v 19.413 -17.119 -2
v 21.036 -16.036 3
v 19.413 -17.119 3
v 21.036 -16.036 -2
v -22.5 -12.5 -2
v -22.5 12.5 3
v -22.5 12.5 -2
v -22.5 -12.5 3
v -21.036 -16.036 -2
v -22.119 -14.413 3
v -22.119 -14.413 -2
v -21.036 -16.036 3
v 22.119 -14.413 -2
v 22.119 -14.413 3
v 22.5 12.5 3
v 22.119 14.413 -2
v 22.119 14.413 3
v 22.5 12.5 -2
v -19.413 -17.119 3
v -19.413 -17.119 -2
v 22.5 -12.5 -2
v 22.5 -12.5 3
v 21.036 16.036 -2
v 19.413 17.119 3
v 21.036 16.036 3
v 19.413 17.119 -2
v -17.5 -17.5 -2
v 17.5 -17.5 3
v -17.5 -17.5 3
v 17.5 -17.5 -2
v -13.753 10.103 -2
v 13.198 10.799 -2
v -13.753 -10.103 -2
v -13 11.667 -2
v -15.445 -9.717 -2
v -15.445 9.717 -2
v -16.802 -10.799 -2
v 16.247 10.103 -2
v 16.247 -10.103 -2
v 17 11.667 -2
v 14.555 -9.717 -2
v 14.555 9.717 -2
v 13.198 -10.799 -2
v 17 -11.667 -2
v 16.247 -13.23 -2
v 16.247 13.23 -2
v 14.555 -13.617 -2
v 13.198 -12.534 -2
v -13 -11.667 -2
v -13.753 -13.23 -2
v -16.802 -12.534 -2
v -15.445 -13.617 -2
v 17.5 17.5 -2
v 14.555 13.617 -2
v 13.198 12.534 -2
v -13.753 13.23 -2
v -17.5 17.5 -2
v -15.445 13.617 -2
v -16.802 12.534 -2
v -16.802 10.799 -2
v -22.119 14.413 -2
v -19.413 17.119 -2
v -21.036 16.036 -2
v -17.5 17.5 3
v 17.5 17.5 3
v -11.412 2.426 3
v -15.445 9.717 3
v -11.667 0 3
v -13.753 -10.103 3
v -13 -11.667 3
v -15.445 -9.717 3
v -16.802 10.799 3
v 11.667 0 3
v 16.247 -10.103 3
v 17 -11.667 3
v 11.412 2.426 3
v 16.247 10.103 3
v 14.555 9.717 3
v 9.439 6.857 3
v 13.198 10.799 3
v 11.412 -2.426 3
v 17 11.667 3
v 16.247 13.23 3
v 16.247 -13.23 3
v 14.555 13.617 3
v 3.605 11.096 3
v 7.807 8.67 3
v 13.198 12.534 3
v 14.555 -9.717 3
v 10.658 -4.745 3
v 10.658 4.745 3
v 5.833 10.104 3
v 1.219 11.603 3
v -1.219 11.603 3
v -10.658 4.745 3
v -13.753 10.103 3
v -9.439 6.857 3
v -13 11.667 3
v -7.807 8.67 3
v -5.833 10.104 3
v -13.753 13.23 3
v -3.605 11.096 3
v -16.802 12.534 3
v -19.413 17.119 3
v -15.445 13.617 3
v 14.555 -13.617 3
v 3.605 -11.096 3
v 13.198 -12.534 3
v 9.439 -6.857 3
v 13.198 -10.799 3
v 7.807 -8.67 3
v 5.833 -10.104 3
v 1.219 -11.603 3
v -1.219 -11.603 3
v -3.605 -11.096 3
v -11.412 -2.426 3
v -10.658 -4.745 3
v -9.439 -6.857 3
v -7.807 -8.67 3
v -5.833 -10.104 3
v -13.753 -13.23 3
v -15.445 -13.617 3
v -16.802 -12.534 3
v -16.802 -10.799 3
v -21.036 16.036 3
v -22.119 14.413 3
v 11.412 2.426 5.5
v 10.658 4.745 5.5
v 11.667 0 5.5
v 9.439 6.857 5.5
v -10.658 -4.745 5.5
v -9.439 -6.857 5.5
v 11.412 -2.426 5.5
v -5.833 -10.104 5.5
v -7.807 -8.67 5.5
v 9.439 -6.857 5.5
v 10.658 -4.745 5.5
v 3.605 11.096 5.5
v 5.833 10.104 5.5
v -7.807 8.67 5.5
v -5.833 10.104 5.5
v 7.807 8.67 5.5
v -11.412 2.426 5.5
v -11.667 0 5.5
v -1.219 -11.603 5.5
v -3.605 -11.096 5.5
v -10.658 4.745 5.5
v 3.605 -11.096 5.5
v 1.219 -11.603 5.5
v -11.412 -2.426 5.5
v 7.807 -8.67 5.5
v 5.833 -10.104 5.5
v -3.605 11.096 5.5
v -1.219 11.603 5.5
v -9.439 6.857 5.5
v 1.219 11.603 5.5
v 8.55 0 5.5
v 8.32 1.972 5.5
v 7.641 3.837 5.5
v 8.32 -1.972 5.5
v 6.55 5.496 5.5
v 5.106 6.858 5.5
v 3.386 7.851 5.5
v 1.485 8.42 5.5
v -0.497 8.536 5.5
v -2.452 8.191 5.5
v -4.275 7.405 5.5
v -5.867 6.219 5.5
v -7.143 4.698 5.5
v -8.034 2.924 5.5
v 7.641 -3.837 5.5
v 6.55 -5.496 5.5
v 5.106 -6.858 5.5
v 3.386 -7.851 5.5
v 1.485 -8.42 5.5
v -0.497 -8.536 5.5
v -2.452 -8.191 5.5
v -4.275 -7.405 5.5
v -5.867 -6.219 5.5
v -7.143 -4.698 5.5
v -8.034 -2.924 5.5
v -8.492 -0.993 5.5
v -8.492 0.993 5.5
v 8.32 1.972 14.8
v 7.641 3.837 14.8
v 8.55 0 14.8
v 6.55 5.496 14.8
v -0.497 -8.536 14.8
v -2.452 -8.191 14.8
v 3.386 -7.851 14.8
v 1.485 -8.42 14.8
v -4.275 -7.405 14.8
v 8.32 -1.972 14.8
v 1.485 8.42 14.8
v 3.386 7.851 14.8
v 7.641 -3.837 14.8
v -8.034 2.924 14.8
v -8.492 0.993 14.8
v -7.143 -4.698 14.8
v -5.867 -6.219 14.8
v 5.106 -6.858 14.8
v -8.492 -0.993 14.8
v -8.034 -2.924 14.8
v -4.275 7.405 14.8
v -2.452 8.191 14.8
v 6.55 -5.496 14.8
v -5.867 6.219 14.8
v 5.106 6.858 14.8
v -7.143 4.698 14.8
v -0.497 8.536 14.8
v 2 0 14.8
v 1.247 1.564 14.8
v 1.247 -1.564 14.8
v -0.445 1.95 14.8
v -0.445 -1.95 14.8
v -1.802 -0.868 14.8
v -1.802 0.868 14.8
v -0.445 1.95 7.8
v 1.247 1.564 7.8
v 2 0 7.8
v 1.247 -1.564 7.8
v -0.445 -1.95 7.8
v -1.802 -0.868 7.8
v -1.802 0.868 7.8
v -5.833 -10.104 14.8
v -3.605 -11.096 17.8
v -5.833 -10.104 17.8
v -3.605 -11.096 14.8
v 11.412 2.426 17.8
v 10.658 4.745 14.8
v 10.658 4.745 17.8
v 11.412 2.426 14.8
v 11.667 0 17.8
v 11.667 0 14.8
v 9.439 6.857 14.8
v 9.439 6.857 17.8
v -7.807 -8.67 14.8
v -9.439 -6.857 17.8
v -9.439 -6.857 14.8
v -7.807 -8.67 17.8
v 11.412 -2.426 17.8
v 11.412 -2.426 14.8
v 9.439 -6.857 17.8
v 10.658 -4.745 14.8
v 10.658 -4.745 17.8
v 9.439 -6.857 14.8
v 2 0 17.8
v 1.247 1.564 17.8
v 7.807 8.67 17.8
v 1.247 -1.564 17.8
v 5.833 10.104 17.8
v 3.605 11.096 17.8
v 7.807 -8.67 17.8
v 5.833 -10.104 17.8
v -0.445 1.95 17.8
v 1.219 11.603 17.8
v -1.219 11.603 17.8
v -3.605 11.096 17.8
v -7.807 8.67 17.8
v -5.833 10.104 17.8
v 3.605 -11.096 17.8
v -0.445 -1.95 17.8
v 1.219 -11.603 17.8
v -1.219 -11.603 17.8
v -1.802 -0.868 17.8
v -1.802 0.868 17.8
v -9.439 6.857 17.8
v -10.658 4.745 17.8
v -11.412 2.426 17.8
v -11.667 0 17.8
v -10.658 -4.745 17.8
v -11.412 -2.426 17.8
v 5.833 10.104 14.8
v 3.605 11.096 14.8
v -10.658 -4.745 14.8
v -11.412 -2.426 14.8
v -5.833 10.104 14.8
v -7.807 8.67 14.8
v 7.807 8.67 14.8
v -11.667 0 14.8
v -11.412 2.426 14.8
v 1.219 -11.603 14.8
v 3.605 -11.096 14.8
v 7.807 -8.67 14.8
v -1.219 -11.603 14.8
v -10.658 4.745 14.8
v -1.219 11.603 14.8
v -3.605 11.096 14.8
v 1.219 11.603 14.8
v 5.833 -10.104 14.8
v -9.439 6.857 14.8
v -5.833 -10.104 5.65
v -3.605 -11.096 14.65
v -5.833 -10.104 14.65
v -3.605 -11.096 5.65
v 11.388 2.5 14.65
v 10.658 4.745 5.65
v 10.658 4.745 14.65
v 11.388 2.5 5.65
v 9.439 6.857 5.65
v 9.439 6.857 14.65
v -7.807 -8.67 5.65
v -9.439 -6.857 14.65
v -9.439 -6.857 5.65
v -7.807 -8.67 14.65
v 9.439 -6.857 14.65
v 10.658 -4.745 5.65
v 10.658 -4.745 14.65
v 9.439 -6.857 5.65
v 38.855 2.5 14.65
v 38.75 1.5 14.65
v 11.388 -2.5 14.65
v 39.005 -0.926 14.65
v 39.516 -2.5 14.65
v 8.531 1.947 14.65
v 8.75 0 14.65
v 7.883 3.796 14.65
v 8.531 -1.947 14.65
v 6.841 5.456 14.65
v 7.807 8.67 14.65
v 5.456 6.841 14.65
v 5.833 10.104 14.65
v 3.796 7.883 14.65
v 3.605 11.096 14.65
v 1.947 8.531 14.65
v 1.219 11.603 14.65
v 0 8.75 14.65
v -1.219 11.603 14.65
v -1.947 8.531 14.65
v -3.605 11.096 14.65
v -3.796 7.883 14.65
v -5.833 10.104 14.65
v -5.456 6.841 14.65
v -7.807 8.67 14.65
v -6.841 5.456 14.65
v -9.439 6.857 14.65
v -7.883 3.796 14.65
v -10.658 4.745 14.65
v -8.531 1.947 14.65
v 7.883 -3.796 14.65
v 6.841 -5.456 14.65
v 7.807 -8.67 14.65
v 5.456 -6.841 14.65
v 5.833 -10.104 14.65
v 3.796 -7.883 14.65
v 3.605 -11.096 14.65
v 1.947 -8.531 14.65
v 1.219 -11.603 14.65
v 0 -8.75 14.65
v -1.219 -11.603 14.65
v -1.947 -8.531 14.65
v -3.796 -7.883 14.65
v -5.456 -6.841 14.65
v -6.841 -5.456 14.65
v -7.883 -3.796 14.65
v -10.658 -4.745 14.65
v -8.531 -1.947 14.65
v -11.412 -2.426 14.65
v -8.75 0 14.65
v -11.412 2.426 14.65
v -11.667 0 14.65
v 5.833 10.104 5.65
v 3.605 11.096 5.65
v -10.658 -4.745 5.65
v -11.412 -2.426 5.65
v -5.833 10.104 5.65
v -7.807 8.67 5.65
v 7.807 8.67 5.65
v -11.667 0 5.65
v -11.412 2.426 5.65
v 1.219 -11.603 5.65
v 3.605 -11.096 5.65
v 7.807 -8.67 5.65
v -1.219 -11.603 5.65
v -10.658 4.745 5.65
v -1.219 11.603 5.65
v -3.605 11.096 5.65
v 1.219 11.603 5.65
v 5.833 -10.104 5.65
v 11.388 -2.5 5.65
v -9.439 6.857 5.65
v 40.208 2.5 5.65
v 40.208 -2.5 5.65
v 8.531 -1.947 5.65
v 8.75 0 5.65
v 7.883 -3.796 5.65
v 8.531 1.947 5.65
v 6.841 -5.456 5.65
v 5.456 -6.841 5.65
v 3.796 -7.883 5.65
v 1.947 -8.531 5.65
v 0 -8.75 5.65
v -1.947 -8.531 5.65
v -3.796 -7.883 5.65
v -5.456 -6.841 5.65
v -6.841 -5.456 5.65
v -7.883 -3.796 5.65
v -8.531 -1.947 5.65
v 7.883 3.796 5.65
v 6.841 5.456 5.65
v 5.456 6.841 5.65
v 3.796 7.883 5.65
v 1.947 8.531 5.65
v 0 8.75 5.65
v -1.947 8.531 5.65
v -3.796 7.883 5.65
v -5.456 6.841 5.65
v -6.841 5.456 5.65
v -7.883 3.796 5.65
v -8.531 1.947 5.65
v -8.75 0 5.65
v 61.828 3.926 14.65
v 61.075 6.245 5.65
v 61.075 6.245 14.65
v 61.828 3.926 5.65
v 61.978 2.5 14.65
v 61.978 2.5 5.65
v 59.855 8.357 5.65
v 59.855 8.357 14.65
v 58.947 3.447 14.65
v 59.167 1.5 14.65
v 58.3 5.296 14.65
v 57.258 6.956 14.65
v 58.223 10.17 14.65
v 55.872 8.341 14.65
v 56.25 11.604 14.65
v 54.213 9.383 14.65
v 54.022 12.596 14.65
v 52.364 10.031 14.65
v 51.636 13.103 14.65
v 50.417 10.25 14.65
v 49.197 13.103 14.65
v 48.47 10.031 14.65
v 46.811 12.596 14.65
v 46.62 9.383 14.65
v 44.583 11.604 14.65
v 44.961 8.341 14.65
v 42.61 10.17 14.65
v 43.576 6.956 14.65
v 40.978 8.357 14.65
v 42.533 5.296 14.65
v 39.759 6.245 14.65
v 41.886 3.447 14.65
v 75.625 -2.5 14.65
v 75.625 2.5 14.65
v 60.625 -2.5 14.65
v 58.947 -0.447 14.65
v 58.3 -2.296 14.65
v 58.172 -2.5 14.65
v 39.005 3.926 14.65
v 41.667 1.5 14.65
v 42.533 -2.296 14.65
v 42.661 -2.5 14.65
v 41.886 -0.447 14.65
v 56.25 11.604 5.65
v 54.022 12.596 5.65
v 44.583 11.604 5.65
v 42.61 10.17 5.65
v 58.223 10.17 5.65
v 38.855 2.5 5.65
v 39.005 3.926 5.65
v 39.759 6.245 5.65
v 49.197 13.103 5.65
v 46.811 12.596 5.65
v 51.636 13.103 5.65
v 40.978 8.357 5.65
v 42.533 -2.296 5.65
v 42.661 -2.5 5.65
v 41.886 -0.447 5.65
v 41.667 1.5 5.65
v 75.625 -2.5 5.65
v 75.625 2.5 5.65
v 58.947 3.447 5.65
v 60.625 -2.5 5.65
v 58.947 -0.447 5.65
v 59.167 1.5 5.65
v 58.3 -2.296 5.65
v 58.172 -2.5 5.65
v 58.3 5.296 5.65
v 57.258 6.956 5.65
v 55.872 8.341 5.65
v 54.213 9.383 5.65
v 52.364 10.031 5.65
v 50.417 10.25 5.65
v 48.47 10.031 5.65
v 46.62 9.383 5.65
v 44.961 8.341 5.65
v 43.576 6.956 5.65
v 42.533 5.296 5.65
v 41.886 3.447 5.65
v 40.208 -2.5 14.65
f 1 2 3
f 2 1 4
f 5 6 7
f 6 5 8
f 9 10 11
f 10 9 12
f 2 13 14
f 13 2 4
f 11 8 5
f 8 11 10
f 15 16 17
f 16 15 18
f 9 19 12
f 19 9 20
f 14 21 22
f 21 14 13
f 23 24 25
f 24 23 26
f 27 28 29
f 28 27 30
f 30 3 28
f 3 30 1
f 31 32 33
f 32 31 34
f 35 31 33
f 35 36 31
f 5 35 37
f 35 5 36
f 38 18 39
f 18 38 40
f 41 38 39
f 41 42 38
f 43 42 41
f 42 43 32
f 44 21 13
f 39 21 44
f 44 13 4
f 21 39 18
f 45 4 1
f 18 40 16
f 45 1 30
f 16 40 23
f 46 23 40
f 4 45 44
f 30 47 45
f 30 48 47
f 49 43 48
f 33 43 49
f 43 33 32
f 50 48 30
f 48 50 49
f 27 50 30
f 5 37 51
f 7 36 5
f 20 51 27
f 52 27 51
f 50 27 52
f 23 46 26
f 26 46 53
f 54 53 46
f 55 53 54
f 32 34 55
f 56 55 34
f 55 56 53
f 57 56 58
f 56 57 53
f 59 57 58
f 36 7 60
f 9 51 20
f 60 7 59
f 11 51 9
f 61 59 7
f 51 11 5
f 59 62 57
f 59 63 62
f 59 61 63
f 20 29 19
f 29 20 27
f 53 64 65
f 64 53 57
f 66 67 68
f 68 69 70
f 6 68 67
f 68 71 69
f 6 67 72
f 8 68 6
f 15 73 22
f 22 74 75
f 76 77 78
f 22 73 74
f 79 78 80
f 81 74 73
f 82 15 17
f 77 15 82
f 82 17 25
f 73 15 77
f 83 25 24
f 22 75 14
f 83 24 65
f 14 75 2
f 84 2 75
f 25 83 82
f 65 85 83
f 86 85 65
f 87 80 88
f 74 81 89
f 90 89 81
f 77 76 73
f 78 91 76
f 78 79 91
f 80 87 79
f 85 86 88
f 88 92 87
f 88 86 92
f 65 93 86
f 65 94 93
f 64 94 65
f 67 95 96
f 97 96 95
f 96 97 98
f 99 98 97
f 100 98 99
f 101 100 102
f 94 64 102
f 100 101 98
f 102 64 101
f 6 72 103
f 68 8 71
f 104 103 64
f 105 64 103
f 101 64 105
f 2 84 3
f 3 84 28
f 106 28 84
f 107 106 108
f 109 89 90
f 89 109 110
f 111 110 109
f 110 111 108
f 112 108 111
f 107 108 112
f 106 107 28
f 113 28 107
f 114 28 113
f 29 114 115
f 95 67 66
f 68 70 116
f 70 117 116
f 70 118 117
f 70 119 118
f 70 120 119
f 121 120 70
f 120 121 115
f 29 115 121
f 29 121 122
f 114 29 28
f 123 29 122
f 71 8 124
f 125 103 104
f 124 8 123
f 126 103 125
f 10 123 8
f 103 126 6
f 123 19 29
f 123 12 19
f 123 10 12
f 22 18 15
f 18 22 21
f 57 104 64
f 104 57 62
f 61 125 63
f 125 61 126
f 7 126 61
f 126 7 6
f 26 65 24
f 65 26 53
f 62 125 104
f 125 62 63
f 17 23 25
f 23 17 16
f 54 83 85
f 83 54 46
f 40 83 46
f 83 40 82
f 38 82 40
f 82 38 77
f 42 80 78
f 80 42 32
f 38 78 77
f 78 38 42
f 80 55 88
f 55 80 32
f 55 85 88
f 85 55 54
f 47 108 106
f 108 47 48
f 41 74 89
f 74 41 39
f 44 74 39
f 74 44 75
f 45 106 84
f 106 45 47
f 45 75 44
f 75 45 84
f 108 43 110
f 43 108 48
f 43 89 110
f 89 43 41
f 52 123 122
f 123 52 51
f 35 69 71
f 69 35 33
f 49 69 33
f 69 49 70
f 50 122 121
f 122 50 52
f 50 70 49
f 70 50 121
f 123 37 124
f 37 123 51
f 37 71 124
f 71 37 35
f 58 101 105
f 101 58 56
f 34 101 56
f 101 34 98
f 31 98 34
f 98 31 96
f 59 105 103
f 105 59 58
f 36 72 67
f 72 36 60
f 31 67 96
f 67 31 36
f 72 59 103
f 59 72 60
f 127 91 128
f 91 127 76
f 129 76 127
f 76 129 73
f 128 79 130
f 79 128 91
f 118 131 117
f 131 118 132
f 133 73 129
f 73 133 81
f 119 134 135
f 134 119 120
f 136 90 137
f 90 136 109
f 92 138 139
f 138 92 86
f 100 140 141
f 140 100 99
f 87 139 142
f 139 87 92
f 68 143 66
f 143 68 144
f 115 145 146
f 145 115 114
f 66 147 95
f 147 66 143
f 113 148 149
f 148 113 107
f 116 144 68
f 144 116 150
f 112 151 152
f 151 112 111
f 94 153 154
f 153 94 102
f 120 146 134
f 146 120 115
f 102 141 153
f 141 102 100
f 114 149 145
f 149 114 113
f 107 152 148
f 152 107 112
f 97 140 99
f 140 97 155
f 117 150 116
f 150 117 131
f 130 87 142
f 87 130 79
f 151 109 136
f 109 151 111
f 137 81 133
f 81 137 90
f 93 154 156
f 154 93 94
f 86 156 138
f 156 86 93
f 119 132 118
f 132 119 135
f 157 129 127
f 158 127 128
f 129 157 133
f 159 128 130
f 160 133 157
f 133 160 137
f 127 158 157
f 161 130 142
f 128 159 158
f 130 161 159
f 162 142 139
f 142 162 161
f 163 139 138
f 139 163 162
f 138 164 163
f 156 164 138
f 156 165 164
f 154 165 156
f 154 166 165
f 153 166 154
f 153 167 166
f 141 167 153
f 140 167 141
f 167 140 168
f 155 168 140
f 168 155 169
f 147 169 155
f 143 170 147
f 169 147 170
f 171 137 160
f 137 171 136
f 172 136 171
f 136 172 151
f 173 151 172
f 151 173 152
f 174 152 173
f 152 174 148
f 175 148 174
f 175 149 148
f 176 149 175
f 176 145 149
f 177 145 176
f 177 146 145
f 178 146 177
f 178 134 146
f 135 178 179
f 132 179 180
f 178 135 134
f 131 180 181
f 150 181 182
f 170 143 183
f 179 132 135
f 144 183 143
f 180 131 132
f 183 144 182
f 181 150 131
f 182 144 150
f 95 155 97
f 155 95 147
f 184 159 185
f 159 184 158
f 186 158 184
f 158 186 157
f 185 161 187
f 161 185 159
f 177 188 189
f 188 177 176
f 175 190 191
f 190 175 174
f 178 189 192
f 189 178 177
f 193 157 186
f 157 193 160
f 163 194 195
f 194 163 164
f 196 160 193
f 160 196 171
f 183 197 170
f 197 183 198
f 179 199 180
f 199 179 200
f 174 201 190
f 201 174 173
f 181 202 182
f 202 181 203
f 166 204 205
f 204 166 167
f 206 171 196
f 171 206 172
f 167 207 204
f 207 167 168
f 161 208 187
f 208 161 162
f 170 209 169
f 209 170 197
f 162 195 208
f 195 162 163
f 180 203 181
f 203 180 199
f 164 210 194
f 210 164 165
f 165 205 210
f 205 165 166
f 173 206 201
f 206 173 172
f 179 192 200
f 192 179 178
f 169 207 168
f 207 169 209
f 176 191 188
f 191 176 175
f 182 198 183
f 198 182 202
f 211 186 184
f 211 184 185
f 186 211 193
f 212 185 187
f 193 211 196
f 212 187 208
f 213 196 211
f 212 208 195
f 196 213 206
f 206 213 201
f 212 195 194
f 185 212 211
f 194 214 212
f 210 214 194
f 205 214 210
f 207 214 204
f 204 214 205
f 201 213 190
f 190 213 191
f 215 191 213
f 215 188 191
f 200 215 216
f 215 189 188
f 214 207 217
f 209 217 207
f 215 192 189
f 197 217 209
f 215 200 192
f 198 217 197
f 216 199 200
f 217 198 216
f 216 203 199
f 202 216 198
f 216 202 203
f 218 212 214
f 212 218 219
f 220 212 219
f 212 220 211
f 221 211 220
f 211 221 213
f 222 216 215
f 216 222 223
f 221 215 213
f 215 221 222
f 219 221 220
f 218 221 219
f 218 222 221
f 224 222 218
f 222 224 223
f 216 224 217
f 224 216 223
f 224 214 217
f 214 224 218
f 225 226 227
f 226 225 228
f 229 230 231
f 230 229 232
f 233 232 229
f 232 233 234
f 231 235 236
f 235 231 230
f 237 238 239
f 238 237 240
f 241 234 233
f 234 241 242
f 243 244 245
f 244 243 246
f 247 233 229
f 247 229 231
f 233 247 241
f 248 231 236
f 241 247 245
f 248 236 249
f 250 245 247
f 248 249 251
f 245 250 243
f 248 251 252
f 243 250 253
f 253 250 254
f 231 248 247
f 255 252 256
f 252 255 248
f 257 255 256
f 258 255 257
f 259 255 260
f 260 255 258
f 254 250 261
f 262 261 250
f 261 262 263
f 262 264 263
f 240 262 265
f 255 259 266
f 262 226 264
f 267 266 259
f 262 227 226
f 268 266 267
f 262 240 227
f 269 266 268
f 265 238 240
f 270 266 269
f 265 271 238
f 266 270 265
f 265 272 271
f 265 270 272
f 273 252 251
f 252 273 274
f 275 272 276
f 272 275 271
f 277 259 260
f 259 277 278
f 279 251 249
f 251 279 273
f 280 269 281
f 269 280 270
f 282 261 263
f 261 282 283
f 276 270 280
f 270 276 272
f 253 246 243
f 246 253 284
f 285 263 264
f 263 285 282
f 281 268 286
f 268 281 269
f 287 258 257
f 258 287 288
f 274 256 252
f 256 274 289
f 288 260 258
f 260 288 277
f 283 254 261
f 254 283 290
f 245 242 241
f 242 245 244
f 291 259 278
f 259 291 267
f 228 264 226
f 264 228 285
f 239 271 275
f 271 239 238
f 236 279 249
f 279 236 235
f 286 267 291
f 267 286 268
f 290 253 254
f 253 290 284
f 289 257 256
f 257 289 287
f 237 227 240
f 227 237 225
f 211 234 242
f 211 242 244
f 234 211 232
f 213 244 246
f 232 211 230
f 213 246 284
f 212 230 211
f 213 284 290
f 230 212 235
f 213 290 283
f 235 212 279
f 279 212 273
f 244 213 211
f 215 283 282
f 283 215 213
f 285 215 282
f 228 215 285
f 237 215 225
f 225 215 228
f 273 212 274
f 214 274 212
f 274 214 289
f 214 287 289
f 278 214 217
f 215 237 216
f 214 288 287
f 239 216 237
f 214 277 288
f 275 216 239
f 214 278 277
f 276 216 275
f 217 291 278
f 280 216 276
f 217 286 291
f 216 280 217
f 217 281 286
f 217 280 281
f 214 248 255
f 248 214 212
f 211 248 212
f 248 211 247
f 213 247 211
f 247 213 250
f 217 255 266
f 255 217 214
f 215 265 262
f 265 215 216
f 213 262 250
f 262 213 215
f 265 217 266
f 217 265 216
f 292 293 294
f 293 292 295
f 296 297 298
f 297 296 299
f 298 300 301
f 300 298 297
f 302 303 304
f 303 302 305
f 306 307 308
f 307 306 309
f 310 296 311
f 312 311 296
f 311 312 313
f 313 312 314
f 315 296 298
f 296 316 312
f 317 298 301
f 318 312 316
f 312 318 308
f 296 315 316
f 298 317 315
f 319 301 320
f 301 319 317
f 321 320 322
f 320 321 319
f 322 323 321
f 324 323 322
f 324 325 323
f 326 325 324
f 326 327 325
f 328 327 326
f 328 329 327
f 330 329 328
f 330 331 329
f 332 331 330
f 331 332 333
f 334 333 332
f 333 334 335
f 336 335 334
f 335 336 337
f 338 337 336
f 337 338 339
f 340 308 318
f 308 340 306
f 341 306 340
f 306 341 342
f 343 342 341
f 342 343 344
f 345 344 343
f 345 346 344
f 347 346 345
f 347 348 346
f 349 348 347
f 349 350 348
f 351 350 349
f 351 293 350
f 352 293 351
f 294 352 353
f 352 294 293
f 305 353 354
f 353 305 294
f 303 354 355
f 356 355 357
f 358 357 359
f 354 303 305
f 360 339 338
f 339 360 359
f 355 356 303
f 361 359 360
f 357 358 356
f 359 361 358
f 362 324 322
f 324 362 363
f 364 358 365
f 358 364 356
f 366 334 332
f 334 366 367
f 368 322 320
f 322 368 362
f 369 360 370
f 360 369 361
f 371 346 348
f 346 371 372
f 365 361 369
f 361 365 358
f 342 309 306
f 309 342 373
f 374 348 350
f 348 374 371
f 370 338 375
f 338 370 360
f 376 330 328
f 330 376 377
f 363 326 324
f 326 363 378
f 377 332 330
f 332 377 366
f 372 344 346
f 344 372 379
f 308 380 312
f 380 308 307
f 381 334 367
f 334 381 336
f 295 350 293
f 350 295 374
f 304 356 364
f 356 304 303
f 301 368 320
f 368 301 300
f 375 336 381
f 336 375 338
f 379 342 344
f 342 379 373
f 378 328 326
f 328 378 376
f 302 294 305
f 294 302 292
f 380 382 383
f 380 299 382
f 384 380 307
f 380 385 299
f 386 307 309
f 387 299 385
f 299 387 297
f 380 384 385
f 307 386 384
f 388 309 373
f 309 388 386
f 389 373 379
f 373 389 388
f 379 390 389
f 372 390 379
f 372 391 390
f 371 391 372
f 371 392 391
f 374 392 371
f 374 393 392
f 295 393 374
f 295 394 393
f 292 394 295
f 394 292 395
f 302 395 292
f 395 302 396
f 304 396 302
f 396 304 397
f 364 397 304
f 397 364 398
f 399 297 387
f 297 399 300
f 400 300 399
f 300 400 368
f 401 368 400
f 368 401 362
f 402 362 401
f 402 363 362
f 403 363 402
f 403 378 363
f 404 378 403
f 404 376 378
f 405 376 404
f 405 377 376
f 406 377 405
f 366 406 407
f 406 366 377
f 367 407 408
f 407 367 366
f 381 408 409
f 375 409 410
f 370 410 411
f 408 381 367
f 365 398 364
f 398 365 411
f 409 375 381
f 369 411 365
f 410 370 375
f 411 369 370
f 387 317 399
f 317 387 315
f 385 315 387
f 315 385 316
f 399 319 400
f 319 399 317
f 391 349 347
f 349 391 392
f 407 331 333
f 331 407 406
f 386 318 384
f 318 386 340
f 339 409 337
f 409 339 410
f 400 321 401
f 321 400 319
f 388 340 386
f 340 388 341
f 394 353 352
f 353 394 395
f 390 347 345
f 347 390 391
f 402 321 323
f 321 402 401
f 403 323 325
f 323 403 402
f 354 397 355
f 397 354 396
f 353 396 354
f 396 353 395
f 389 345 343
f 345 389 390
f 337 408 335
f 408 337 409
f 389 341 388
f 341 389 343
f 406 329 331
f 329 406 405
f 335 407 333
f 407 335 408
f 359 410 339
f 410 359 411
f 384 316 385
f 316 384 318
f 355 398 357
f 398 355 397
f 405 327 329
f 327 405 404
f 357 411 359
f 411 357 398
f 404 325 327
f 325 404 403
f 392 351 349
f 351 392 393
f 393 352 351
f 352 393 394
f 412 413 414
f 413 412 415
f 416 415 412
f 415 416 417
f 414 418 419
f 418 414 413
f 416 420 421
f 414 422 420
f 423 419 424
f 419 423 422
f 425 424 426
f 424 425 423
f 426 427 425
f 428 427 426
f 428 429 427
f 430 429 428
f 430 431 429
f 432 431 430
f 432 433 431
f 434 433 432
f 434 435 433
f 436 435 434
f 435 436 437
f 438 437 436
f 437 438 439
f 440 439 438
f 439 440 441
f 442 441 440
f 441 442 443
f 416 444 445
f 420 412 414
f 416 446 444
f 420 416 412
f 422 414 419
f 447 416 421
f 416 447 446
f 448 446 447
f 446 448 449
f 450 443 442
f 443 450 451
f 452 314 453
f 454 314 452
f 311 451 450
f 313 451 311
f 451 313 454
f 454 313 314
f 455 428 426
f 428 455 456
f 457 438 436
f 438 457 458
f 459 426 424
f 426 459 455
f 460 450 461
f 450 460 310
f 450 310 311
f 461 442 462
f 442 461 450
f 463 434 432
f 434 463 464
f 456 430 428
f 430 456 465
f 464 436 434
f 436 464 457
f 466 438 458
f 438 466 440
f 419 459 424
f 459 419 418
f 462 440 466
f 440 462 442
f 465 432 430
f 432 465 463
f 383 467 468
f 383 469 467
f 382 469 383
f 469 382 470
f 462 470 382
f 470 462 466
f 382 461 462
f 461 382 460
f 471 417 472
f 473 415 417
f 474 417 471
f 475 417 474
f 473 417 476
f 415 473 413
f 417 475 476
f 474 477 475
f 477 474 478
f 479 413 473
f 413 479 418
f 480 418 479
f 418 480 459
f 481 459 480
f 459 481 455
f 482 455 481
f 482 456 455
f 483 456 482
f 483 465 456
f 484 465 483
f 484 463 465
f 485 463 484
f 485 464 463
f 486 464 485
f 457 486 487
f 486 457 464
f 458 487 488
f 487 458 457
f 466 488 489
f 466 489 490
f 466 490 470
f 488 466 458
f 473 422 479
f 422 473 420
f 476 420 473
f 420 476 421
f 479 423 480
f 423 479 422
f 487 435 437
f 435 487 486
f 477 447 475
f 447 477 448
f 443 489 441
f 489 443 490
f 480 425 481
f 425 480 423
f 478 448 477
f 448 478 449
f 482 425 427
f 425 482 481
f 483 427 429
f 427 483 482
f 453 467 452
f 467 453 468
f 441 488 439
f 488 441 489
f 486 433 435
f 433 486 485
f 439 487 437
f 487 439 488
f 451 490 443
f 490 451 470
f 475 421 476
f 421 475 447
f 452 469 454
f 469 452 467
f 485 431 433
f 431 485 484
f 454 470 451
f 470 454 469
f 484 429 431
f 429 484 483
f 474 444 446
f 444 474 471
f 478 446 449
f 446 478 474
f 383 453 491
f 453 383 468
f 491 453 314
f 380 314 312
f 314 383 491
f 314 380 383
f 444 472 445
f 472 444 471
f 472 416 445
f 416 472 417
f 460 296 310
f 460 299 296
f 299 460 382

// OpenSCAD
// Which one would you like to see?
part = "all"; // [first:Base Only,second:Top Only,third:Hook only,all:All]

/* [Base Settings] */
BaseHeight=5;
BaseLength=45;
BaseWidth=35;
//This one applies also to the hole to set the top on to the base.
MountingHoles=4;
/* [Pillar Settings] */
CylHeight=15;
Spacing=.3;
/* [Hook Settings] */
HookLength=30;
TabLength=15;
/* [Hidden] */
TabWidth=5;
print_part();

module print_part(){
    if(part=="first"){
        Base(BaseHeight,BaseLength,BaseWidth,MountingHoles,CylHeight);
    }
    else if(part=="second"){
        translate([0,0,BaseHeight/2+Spacing+CylHeight-CylHeight/5]) Top(BaseHeight,MountingHoles);
    }
    else if(part=="third"){
        translate([0,0,CylHeight/5]) Hook(HookLength,BaseHeight,BaseWidth,TabLength,CylHeight,Spacing);
    }
    else if(part=="all"){
        Base(BaseHeight,BaseLength,BaseWidth,MountingHoles,CylHeight);
translate([0,0,BaseHeight/2+Spacing+CylHeight-CylHeight/5]) Top(BaseHeight,MountingHoles);
translate([0,0,CylHeight/5]) Hook(HookLength,BaseHeight,BaseWidth,TabLength,CylHeight,Spacing);
    }
}

module Base(BaseHeight,BaseLength,BaseWidth,MountingHole,CylHeight){
    union(){difference(){
        minkowski(){
            cube([BaseLength-10,BaseWidth-10,BaseHeight-1],center=true);
            cylinder(r=5,h=1);
        }
        translate([BaseLength/3,BaseWidth/3,-BaseHeight/2+0.5]) cylinder(h=BaseHeight,r=MountingHoles/2);
        translate([BaseLength/3,-BaseWidth/3,-BaseHeight/2+0.5]) cylinder(h=BaseHeight,r=MountingHoles/2);
        translate([-BaseLength/3,-BaseWidth/3,-BaseHeight/2+0.5]) cylinder(h=BaseHeight,r=MountingHoles/2);
        translate([-BaseLength/3,BaseWidth/3,-BaseHeight/2+0.5]) cylinder(h=BaseHeight,r=MountingHoles/2);
    }
    difference(){
        union(){
            if(BaseLength<BaseWidth){
                translate([0,0,BaseHeight/2]) cylinder(r=BaseLength/3,h=(CylHeight/5));
                translate([0,0,BaseHeight/2+CylHeight/5]) cylinder(r=BaseLength/4-0.2,h=(CylHeight+Spacing)-((CylHeight/5)*2));
            }
            else{
                translate([0,0,BaseHeight/2]) cylinder(r=BaseWidth/3,h=(CylHeight/5));
                translate([0,0,BaseHeight/2+CylHeight/5]) cylinder(r=BaseWidth/4-0.2,h=(CylHeight+Spacing)-((CylHeight/5)*2));
            }
            
        }
            translate([0,0,(BaseHeight/2)+CylHeight-(CylHeight/1.5)+Spacing]) cylinder(r=MountingHoles/2,h=CylHeight/1.5);
        }
    }
}

module Top(BaseHeight,MountingHoles){
    if(BaseLength<BaseWidth){
                difference(){
                cylinder(r=BaseLength/3,h=CylHeight/5);
        cylinder(r=MountingHoles/2,h=CylHeight/5);
            }
        }
            else{
                difference(){
                cylinder(r=BaseWidth/3,h=CylHeight/5);
        cylinder(r=MountingHoles/2,h=CylHeight/5);
            }
    }
}

module Hook(HookLength,BaseHeight,BaseWidth,TabLength,CylHeight,Spacing){      
            if(BaseLength<BaseWidth){
                difference(){
                translate([0,0,BaseHeight/2+Spacing/2]) cylinder(r=BaseLength/3,h=(CylHeight)-(2*(CylHeight/5)));
                 translate([0,0,BaseHeight/2+Spacing/2]) cylinder(r=BaseLength/4,h=(CylHeight-(2*(CylHeight/5))));   
                }
            }
            else{
                difference(){
                translate([0,0,BaseHeight/2+Spacing/2]) cylinder(r=BaseWidth/3,h=(CylHeight-(2*(CylHeight/5))));
                    translate([0,0,BaseHeight/2+Spacing/2]) cylinder(r=BaseWidth/4,h=(CylHeight-(2*(CylHeight/5))));}
            }
        if(BaseLength<BaseWidth){
                translate([BaseLength/3-BaseLength/24,-TabWidth/2,BaseHeight/2+Spacing/2]) cube([HookLength,TabWidth,CylHeight-(2*(CylHeight/5))]);
            }
            else{
                translate([BaseWidth/3-BaseWidth/24,-TabWidth/2,BaseHeight/2+Spacing/2]) cube([HookLength,TabWidth,CylHeight-(2*(CylHeight/5))]);
            }
            if(BaseLength<BaseWidth){
                union(){
                translate([HookLength-BaseLength/12+BaseLength/1.5,1.5,BaseHeight/2+Spacing/2]){difference(){
                cylinder(r=BaseLength/3,h=(CylHeight)-(2*(CylHeight/5)));
                cylinder(r=BaseLength/4,h=(CylHeight-(2*(CylHeight/5))));
                translate([-BaseLength/3,-BaseLength/3-4,0]) cube([BaseLength/1.5,BaseLength/3,CylHeight-(2*(CylHeight/5))]);
                }
                translate([BaseLength/3-BaseLength/24,-4,0]) cube([TabLength,TabWidth,(CylHeight-(2*(CylHeight/5)))]);
            }
            }
            }
            else{
                union(){
                translate([HookLength-BaseWidth/12+BaseWidth/1.5,1.5,BaseHeight/2+Spacing/2]){difference(){
                cylinder(r=BaseWidth/3,h=(CylHeight)-(2*(CylHeight/5)));
                cylinder(r=BaseWidth/4,h=(CylHeight-(2*(CylHeight/5))));
                translate([-BaseWidth/3,-BaseWidth/3-4,0]) cube([BaseWidth/1.5,BaseWidth/3,CylHeight-(2*(CylHeight/5))]);
                }
                translate([BaseWidth/3-BaseWidth/24,-4,0]) cube([TabLength,TabWidth,(CylHeight-(2*(CylHeight/5)))]);
            }
            }
            }
}

/*Base(BaseHeight,BaseLength,BaseWidth,MountingHoles,CylHeight);
translate([0,0,BaseHeight/2+Spacing+CylHeight-CylHeight/5]) Top(BaseHeight,MountingHoles);
translate([0,0,CylHeight/5]) Hook(HookLength,BaseHeight,BaseWidth,TabLength,CylHeight,Spacing);
*/

